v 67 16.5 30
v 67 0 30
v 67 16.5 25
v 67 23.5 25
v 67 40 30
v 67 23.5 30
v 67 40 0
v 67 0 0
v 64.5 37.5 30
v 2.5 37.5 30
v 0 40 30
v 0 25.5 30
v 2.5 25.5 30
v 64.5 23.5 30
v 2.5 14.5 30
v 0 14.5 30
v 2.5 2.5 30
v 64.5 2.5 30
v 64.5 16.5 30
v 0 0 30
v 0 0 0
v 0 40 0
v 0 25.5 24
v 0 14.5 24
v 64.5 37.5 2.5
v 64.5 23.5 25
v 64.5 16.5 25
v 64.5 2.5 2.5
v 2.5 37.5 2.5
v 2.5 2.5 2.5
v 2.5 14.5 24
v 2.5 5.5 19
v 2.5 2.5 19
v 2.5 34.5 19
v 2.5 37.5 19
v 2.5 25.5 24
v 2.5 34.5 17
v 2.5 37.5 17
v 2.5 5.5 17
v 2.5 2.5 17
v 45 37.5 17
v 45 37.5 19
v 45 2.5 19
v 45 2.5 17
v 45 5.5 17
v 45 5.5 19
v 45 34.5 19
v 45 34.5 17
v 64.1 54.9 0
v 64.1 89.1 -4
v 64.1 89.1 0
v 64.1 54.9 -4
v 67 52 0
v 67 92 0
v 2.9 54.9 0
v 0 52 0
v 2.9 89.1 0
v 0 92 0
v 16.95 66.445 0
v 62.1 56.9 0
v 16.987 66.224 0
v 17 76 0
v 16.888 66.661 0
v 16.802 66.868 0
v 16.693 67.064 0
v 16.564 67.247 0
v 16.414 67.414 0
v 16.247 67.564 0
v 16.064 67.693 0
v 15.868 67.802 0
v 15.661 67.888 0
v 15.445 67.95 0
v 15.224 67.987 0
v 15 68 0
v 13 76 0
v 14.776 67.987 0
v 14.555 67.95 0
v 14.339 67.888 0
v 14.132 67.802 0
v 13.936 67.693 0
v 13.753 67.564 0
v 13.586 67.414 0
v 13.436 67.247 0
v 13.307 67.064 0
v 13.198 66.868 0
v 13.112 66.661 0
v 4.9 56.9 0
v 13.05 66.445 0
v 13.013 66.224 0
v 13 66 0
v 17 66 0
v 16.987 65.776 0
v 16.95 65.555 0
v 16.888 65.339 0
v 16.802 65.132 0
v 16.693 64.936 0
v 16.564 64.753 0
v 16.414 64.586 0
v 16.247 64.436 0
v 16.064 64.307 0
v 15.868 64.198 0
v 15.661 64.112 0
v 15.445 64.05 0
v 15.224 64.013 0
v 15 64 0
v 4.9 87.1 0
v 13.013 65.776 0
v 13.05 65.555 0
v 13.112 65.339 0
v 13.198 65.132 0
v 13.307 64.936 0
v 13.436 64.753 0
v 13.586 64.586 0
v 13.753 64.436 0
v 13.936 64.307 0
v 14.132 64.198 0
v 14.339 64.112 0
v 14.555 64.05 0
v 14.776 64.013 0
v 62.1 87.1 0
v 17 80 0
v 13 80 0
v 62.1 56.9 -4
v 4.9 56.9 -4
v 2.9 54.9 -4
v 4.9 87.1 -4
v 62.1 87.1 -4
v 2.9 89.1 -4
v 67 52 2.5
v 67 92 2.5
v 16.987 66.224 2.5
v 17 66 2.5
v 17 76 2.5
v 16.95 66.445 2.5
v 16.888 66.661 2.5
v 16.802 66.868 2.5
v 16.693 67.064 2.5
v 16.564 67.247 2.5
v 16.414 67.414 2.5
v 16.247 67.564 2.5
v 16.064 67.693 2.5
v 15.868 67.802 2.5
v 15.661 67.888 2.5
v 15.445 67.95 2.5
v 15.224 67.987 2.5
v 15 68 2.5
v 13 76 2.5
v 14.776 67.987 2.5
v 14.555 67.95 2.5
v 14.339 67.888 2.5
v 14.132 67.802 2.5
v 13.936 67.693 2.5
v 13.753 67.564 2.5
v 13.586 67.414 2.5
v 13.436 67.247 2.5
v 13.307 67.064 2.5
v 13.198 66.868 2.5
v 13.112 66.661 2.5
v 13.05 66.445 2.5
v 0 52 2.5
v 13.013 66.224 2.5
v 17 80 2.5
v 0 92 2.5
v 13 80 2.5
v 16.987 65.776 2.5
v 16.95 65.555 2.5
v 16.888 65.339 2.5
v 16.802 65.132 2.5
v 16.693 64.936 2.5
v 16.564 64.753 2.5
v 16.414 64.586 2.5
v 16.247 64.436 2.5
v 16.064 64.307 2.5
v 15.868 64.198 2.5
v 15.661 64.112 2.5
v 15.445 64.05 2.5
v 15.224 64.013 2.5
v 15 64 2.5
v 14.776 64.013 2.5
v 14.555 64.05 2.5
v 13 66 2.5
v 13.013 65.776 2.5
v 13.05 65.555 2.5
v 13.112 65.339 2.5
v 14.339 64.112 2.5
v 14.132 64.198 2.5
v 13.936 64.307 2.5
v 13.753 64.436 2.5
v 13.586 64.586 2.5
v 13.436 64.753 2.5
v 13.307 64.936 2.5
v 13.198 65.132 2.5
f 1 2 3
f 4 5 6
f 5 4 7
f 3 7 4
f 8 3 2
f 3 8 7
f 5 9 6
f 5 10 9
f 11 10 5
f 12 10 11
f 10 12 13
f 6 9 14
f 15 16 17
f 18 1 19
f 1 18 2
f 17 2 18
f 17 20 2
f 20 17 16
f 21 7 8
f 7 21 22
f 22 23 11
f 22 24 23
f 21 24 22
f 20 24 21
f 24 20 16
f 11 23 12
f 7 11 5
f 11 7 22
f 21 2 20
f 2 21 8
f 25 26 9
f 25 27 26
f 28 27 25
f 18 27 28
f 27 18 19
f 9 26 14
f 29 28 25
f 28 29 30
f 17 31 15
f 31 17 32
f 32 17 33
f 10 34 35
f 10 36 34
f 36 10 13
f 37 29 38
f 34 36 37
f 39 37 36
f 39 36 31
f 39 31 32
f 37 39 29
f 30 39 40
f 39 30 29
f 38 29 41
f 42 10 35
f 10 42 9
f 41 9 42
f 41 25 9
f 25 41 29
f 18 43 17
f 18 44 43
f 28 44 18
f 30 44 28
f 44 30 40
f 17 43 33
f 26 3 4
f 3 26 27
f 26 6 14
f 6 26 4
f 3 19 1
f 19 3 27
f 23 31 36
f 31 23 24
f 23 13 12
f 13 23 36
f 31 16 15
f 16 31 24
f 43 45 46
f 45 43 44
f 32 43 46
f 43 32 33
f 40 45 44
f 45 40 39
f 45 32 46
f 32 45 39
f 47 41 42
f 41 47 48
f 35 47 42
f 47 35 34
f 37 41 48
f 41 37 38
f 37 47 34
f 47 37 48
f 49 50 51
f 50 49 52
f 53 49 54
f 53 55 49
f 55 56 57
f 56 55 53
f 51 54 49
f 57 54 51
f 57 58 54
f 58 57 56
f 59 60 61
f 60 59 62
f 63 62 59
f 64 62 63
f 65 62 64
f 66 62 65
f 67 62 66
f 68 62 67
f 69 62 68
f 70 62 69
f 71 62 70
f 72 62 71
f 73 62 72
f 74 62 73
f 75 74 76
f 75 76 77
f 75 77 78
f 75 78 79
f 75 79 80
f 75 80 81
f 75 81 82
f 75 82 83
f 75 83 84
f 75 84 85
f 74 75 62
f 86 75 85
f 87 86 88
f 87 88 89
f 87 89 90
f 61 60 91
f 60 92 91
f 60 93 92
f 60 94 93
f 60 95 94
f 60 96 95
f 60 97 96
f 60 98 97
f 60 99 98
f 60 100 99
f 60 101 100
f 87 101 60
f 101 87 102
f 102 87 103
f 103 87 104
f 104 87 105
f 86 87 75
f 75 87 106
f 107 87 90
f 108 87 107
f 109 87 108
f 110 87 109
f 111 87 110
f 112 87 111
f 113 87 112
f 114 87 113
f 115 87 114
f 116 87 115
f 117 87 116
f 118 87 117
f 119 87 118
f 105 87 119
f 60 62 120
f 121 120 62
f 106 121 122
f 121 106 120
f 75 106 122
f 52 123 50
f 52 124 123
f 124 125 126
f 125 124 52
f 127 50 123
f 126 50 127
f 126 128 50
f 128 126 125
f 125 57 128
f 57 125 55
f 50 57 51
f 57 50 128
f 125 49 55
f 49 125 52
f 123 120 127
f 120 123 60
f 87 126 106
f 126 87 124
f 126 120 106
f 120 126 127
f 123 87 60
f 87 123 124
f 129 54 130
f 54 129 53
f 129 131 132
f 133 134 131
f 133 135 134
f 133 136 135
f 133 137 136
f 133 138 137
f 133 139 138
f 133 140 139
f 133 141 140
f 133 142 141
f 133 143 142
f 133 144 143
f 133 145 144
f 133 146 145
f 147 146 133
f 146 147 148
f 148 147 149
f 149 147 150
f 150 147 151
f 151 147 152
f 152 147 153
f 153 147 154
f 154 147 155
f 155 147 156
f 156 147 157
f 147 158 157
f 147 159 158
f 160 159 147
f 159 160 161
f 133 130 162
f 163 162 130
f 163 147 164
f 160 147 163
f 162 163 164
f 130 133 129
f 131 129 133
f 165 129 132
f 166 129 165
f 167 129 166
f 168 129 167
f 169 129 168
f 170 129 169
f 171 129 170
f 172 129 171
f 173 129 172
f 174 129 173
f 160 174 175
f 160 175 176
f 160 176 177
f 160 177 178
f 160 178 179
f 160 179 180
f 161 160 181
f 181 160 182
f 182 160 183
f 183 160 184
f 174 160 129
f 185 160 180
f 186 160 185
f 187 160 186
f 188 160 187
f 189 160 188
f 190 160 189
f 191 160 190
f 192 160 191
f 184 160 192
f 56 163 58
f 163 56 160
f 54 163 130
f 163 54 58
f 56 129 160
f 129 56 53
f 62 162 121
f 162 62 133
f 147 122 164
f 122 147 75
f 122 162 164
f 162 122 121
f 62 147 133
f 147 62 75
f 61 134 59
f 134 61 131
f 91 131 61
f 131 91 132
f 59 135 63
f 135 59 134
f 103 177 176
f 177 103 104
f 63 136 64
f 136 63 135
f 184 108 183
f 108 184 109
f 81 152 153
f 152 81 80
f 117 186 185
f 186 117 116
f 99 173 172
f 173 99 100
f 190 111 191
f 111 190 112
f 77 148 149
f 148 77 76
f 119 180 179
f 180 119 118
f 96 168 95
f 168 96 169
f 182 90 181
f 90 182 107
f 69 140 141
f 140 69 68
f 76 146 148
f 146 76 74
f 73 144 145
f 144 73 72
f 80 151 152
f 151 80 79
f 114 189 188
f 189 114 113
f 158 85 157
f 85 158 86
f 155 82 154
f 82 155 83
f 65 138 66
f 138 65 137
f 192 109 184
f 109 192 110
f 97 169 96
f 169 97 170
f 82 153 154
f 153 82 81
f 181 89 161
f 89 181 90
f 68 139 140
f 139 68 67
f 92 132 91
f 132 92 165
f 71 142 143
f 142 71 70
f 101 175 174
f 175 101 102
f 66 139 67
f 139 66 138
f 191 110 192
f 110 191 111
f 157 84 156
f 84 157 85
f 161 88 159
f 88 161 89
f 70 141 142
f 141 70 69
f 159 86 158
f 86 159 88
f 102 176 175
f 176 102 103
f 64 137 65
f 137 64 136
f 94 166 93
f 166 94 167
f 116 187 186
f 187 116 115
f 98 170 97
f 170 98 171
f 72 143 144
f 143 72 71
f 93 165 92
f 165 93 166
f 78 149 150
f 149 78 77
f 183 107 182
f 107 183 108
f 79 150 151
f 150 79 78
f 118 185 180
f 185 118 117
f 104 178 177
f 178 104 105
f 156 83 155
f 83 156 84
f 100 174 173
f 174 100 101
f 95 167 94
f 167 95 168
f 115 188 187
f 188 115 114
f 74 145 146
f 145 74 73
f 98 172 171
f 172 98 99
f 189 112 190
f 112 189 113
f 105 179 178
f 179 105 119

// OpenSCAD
// =====================================================================
//  bFaaaP Switch — simple 3D-printable enclosure   (AI DRAFT DESIGN)
// ---------------------------------------------------------------------
//  Parametric case for: Adafruit ItsyBitsy nRF52840 + 2x AA holder +
//  RU1J002YN low-side MOSFET. Two parts: base tray + lid.
//  Cable & USB are U-notches in the base rim (closed by the lid -> no
//  support needed when printed open-side-down). Lid has a DotStar LED
//  window + a RESET access hole.
//
//  ⚠️ AI DRAFT DESIGN — generated by the bFaaaP project, UNTESTED.
//  Verify fit against your actual parts and adjust before printing.
//  License: CERN-OHL-W-2.0 (hardware) / CC BY 4.0 (drawing). Units: mm.
//  Open in OpenSCAD (free); set `part` then F6 -> Export STL.
// =====================================================================

part   = "both";   // "base", "lid", or "both"

// ---- main dimensions (edit to fit your parts) ----
L      = 67;   // external length
W      = 40;   // external width
T      = 2.5;  // wall thickness
FT     = 2.5;  // floor thickness
HB     = 30;   // base (tray) height
LT     = 2.5;  // lid plate thickness
LIP_H  = 4;    // lid locating-lip height
CL     = 0.4;  // lip clearance (loosen if too tight)
SHELF  = 17;   // board-shelf height above the floor
BX1    = 45;   // board shelf extends to this X

// feature positions
CABLE_W = 7;   CABLE_D = 5;     // cable notch (right wall)
USB_W   = 11;  USB_D   = 6;     // USB notch (left wall)
LED_X   = 15;  LED_S   = 4;     // LED window centre X, square side
RST_X   = 15;  RST_R   = 2;     // RESET hole centre X, radius
$fn     = 56;

module base() {
  difference() {
    cube([L, W, HB]);
    translate([T, T, FT])           cube([L - 2*T, W - 2*T, HB]);              // cavity (open top)
    translate([L - T - 1, (W-CABLE_W)/2, HB - CABLE_D]) cube([T + 2, CABLE_W, CABLE_D + 1]); // cable
    translate([-1, (W-USB_W)/2, HB - USB_D])            cube([T + 2, USB_W, USB_D + 1]);     // USB
  }
  // board shelf ledges (front + back inner walls)
  translate([T, T, SHELF])          cube([BX1 - T, 3, 2]);
  translate([T, W - T - 3, SHELF])  cube([BX1 - T, 3, 2]);
}

module lid() {
  difference() {
    union() {
      cube([L, W, LT]);
      translate([0, 0, -LIP_H]) difference() {                                 // locating lip frame
        translate([T + CL, T + CL, 0])
          cube([L - 2*(T + CL), W - 2*(T + CL), LIP_H]);
        translate([T + CL + 2, T + CL + 2, -1])
          cube([L - 2*(T + CL + 2), W - 2*(T + CL + 2), LIP_H + 2]);
      }
    }
    translate([LED_X - LED_S/2, W/2 + 6 - LED_S/2, -1]) cube([LED_S, LED_S, LT + 2]); // LED window
    translate([RST_X, W/2 - 6, -1]) cylinder(h = LT + 2, r = RST_R);                  // RESET hole
  }
}

if (part == "base" || part == "both") base();
if (part == "lid"  || part == "both") translate([0, W + 12, 0]) lid();
